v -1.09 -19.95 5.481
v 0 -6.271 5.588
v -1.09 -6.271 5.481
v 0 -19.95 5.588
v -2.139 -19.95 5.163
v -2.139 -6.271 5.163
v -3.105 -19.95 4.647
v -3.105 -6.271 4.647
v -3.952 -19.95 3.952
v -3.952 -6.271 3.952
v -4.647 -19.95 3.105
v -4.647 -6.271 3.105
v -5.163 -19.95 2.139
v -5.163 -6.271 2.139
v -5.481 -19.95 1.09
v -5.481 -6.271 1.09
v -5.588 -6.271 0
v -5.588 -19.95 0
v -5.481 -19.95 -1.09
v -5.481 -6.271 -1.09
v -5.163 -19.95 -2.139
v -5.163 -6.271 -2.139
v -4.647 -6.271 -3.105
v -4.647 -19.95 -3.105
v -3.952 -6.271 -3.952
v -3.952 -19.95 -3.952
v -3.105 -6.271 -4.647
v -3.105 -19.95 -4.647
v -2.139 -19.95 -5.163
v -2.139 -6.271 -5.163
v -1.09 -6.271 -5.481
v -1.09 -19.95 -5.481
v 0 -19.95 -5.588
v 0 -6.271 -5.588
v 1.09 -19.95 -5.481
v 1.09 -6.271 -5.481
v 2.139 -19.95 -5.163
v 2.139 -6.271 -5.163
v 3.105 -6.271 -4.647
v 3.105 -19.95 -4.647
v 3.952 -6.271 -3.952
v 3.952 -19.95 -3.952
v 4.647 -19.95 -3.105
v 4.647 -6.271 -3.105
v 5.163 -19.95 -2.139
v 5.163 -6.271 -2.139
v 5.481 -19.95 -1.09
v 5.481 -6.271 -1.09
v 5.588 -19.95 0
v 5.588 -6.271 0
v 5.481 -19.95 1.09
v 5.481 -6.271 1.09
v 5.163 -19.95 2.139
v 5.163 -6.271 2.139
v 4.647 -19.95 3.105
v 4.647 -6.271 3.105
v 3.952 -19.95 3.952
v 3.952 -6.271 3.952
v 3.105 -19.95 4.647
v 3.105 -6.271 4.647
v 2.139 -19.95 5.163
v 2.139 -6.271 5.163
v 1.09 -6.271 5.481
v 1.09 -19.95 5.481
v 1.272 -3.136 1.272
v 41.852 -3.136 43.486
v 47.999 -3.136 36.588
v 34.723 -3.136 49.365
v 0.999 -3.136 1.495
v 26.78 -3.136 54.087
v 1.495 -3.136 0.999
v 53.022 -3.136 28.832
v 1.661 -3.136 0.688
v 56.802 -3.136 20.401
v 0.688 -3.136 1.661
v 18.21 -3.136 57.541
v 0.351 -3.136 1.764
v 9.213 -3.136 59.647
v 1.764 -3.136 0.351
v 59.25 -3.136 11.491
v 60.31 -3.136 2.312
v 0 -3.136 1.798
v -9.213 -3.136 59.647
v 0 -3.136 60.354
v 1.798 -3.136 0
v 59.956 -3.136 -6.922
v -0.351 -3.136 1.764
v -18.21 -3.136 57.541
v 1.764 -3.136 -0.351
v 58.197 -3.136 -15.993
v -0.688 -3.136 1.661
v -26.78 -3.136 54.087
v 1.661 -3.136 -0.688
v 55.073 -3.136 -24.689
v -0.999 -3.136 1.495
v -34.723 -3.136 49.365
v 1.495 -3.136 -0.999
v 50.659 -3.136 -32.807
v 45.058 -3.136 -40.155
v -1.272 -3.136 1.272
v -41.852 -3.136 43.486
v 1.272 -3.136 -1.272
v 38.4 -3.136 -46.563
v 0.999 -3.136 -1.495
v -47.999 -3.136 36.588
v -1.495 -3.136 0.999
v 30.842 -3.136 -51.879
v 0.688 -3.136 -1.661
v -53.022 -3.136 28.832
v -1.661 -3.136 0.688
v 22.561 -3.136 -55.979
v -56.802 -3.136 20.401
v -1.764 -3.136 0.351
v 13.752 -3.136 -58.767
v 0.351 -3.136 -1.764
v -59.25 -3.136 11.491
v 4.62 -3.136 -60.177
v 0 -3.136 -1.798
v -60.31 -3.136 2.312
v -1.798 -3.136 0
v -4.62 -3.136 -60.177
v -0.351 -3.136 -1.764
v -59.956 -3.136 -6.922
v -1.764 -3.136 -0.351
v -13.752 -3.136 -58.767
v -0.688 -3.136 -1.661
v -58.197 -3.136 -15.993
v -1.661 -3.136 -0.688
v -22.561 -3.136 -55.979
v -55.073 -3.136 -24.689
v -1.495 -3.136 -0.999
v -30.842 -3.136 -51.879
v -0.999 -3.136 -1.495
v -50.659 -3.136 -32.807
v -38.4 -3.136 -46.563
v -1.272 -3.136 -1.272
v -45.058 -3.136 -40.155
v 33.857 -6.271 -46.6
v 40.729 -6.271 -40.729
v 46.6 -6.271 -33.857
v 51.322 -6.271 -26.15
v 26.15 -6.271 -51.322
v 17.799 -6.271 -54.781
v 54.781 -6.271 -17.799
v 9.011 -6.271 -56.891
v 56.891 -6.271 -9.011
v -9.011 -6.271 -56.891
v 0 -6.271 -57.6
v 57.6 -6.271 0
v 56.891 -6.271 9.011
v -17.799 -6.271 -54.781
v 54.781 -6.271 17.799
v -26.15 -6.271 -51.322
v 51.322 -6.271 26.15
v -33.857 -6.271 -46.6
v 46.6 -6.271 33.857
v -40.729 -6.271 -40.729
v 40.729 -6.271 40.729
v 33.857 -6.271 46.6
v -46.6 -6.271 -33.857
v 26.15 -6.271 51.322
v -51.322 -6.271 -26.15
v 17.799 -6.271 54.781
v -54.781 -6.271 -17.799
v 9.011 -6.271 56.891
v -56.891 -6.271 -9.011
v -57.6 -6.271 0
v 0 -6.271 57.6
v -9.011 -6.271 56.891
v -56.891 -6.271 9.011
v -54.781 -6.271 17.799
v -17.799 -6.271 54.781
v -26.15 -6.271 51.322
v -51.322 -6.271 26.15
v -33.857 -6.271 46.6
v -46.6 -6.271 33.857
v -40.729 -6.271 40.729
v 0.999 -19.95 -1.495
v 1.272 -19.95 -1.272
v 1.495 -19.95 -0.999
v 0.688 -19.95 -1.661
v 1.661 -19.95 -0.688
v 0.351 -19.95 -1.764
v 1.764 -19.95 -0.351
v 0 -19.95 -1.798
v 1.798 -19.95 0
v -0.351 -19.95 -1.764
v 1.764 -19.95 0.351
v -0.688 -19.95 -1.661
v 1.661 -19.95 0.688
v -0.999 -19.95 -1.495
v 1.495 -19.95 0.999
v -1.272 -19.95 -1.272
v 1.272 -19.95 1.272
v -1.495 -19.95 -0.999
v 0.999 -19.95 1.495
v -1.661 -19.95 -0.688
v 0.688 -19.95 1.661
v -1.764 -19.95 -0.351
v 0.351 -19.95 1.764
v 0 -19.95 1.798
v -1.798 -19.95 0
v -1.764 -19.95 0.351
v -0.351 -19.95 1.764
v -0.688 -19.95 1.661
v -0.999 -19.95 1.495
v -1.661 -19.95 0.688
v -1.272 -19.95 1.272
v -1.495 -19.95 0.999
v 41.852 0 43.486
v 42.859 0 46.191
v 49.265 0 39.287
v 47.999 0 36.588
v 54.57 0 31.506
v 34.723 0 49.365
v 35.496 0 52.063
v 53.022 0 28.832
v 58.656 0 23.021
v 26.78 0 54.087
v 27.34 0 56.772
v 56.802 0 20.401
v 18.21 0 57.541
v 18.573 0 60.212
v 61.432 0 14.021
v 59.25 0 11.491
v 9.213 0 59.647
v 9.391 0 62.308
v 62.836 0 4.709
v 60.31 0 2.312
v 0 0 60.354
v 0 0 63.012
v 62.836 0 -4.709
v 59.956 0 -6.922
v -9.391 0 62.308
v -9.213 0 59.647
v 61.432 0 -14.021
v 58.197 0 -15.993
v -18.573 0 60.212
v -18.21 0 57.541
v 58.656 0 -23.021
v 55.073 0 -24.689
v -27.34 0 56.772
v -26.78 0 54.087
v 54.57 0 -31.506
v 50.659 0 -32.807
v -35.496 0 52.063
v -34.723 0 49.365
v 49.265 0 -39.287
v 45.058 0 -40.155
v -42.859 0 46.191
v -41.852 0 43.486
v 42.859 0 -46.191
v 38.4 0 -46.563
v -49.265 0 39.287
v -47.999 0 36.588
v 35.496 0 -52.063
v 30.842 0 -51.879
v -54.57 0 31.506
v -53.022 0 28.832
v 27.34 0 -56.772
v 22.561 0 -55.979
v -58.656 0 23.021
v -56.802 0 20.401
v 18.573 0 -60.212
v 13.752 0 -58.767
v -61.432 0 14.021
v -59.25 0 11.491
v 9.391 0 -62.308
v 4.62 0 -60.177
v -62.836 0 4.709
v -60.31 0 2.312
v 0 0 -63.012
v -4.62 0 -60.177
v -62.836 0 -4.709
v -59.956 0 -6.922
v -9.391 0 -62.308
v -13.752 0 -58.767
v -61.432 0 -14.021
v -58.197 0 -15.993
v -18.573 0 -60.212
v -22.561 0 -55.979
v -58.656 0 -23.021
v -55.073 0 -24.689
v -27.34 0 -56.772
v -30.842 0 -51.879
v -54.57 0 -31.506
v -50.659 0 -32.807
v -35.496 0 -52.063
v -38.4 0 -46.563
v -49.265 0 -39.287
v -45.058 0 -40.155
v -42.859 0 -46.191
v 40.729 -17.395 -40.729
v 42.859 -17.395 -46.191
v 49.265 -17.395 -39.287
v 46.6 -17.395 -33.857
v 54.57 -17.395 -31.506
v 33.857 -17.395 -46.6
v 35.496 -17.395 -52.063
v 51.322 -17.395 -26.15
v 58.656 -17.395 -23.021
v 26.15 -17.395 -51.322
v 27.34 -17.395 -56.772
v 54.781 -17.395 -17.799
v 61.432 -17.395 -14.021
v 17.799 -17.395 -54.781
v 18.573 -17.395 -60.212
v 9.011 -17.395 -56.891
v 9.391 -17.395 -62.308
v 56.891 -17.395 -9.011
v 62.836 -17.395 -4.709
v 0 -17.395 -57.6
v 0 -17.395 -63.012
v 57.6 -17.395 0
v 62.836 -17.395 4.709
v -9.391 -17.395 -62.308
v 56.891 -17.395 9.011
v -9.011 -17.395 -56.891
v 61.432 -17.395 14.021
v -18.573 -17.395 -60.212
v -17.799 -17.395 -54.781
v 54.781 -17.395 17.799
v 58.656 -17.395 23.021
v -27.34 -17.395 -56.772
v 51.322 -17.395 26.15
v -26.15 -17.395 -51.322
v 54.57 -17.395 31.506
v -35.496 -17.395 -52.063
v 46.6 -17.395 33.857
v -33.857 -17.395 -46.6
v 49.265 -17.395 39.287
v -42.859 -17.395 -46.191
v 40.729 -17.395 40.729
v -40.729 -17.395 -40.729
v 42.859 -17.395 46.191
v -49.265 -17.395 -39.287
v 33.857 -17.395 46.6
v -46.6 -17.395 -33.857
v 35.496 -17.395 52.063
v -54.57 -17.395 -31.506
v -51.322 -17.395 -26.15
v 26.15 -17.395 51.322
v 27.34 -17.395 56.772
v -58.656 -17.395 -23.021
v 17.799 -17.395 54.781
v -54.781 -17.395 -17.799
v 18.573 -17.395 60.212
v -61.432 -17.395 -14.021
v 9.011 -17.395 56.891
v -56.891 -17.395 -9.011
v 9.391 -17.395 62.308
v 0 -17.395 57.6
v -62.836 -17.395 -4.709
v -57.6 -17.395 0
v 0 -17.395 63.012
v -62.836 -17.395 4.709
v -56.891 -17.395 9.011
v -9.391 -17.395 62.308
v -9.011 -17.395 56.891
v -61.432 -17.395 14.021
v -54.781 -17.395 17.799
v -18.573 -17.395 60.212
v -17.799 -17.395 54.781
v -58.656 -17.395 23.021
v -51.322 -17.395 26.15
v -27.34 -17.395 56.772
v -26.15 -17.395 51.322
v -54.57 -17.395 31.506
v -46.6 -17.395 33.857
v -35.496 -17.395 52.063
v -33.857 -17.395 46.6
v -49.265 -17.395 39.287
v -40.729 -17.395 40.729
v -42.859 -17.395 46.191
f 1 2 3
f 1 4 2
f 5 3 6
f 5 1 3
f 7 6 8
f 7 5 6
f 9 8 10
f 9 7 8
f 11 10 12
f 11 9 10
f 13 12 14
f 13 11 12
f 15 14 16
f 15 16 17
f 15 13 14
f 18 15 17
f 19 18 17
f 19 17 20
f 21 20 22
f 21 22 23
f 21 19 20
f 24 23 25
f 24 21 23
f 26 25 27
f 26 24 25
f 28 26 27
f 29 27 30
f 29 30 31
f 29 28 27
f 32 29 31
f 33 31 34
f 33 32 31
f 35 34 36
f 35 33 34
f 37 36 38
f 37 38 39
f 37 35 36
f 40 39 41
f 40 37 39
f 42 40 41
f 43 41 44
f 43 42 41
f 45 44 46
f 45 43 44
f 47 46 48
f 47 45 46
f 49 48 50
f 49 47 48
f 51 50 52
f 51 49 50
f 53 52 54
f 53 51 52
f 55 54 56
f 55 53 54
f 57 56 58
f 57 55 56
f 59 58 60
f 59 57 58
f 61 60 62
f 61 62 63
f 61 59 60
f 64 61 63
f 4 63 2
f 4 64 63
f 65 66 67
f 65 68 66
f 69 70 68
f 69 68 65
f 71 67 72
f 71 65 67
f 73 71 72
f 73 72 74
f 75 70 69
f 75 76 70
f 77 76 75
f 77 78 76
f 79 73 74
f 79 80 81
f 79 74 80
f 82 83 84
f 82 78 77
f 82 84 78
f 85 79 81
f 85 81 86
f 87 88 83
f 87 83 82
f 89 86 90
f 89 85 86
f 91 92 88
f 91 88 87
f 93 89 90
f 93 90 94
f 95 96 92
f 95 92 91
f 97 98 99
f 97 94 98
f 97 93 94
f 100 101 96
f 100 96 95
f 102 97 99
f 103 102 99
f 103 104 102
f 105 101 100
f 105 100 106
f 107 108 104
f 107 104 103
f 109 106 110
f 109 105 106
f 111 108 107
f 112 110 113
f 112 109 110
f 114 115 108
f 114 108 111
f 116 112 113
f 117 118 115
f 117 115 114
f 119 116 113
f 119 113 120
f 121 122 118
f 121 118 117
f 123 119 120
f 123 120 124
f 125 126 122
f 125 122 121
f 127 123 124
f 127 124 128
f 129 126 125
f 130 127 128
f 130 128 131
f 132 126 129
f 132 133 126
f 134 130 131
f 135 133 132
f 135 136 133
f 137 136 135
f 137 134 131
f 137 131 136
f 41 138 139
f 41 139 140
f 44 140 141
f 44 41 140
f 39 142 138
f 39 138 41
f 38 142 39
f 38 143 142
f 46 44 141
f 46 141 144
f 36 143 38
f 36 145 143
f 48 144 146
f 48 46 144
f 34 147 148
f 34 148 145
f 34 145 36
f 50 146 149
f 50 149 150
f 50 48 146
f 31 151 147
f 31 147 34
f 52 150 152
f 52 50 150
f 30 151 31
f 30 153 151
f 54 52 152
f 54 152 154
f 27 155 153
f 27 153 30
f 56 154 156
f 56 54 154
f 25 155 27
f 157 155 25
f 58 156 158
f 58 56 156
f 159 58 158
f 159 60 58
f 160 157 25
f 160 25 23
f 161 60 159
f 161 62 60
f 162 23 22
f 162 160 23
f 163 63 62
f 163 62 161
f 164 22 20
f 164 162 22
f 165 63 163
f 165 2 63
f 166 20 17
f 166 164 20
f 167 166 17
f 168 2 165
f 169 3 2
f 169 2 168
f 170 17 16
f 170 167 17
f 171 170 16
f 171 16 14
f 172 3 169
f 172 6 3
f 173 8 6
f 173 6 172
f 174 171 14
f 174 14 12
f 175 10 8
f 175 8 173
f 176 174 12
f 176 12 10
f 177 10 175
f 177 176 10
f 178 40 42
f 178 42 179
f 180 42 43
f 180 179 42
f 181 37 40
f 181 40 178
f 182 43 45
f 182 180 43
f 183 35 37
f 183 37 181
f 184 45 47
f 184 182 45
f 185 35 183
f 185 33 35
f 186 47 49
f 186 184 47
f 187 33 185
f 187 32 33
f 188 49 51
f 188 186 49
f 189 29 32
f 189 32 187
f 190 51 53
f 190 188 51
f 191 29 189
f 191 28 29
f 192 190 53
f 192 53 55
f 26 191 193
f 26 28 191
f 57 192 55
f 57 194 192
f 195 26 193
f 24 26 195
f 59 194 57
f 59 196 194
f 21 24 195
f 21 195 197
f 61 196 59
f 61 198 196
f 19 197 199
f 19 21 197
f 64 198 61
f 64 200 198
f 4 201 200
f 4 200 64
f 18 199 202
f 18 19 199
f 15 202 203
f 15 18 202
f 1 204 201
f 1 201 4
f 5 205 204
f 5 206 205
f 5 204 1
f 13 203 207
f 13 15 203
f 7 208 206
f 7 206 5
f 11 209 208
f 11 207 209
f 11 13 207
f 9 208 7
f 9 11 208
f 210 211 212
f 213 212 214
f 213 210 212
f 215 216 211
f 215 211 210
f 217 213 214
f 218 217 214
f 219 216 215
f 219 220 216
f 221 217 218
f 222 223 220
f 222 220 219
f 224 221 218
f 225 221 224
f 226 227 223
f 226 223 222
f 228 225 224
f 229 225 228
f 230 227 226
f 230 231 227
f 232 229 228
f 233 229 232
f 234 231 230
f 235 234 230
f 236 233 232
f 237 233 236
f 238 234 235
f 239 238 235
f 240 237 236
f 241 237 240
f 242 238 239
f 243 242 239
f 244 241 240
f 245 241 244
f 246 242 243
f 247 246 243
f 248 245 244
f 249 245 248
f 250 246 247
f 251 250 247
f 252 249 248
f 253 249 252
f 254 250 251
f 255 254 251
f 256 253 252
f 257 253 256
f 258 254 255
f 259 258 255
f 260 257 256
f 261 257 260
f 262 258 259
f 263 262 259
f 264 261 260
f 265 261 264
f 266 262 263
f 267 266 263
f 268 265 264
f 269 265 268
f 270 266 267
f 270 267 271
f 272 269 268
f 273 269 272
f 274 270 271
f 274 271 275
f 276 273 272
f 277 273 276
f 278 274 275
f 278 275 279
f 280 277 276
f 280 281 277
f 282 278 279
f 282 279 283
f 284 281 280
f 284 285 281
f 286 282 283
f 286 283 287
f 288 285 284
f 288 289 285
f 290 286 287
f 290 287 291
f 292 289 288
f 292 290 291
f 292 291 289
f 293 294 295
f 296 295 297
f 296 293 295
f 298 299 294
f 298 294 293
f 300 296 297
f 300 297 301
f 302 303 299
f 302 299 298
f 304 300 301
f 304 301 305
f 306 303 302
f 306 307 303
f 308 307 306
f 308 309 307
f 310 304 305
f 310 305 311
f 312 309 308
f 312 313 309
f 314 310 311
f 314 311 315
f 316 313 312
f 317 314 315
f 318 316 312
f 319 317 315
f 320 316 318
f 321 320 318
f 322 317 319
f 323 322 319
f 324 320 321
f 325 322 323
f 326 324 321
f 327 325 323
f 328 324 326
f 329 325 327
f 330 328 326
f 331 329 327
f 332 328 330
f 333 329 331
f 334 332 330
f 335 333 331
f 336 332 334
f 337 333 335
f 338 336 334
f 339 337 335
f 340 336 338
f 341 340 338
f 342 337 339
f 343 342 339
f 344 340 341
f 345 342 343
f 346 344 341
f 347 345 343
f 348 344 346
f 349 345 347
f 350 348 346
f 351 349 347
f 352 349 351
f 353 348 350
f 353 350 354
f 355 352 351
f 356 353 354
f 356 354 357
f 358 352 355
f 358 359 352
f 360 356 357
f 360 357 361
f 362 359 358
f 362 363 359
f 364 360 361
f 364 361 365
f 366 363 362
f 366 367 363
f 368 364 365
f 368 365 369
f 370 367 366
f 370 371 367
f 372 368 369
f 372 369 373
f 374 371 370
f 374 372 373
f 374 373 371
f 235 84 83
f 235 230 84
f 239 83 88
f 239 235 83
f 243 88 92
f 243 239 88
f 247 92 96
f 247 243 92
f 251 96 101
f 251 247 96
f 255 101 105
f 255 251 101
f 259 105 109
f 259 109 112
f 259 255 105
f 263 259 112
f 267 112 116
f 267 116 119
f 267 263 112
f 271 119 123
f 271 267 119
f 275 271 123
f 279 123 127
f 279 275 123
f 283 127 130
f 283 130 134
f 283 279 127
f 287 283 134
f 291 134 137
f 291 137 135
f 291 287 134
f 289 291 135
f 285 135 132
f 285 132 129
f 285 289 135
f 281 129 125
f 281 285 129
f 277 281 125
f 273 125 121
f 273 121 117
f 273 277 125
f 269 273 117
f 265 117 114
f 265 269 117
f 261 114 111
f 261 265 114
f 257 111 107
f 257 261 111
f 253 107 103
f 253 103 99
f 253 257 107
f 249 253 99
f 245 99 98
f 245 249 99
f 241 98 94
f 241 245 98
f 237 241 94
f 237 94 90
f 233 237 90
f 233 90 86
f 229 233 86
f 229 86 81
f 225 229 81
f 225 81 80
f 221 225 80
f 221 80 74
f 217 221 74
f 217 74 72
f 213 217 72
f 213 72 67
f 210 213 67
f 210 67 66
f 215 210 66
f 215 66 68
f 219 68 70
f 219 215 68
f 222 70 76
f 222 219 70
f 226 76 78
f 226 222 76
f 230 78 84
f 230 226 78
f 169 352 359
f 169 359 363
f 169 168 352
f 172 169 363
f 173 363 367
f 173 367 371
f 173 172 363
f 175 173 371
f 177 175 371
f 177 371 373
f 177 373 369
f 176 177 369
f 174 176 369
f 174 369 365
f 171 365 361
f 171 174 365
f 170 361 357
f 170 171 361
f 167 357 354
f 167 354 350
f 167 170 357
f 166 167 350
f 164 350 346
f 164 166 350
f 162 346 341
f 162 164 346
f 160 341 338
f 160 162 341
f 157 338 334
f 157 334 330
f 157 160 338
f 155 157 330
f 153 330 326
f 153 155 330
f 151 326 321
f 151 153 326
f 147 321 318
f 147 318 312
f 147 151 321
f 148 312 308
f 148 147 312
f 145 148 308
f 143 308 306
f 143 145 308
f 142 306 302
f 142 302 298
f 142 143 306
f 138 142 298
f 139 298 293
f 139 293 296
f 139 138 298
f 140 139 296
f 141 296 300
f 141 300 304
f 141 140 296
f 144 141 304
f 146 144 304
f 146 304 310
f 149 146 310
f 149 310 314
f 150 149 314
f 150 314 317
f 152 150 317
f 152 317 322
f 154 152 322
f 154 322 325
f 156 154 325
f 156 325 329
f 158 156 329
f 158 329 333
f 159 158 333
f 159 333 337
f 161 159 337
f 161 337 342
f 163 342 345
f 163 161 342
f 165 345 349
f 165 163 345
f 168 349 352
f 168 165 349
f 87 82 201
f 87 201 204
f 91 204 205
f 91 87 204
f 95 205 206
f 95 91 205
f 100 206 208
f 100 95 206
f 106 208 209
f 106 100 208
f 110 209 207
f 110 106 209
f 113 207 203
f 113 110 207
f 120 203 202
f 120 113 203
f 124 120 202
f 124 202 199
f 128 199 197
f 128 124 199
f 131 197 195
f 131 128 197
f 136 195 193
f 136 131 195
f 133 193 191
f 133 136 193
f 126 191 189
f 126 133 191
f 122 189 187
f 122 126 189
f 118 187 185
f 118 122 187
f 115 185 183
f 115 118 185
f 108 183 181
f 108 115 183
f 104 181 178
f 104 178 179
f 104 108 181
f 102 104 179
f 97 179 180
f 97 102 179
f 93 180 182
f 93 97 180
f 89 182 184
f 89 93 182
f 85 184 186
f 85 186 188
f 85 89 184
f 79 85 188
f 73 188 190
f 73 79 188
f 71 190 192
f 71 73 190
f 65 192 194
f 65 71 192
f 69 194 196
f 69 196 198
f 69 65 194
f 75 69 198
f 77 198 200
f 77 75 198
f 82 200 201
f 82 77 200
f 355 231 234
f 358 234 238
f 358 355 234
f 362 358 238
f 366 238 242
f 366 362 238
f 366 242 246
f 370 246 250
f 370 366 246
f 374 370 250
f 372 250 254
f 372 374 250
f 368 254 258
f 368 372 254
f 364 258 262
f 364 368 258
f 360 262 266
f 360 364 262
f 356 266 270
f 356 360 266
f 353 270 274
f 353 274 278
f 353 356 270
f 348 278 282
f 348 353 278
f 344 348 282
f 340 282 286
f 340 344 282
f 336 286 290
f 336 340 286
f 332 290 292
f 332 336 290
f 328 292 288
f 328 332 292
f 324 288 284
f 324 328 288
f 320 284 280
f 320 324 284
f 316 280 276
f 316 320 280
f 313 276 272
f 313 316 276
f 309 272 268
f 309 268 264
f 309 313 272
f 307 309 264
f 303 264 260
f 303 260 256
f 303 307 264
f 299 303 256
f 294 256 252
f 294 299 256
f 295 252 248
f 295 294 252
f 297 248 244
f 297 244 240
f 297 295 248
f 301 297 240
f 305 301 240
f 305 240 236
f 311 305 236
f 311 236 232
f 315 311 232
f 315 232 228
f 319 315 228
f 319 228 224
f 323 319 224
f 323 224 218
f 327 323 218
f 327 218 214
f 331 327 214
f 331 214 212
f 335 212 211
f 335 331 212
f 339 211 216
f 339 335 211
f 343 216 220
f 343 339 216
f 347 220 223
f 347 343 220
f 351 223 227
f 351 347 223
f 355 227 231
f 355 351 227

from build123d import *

# Parameters (mm, degrees)
F3_W = 3.1359323766
F3_H = 60.3541191667


with BuildPart() as f2:
    # F0 (on Right) → F2 (revolve)
    with BuildSketch(Plane.YZ):
        Polygon((0, 1.7982171848), (0, 63.0117803812), (-17.3947568983, 63.0117803812), (-17.3947568983, 57.600159198), (-6.2708631158, 57.600159198), (-6.2708631158, 40.162704885), (-6.2708631158, 5.5884346366), (-19.9502557516, 5.5884346366), (-19.9502557516, 1.7982171848), align=None)
    revolve(axis=Axis((0, -6.3099395484, 0), (0, -1, 0)))

    # F3 (on Right) → F4 (revolve, cut)
    with BuildSketch(Plane.YZ):
        with Locations((-1.5679661883, 30.1770595834)):
            Rectangle(F3_W, F3_H)
    revolve(axis=Axis((0, -6.3099395484, 0), (0, -1, 0)), mode=Mode.SUBTRACT)


solid = f2.part
